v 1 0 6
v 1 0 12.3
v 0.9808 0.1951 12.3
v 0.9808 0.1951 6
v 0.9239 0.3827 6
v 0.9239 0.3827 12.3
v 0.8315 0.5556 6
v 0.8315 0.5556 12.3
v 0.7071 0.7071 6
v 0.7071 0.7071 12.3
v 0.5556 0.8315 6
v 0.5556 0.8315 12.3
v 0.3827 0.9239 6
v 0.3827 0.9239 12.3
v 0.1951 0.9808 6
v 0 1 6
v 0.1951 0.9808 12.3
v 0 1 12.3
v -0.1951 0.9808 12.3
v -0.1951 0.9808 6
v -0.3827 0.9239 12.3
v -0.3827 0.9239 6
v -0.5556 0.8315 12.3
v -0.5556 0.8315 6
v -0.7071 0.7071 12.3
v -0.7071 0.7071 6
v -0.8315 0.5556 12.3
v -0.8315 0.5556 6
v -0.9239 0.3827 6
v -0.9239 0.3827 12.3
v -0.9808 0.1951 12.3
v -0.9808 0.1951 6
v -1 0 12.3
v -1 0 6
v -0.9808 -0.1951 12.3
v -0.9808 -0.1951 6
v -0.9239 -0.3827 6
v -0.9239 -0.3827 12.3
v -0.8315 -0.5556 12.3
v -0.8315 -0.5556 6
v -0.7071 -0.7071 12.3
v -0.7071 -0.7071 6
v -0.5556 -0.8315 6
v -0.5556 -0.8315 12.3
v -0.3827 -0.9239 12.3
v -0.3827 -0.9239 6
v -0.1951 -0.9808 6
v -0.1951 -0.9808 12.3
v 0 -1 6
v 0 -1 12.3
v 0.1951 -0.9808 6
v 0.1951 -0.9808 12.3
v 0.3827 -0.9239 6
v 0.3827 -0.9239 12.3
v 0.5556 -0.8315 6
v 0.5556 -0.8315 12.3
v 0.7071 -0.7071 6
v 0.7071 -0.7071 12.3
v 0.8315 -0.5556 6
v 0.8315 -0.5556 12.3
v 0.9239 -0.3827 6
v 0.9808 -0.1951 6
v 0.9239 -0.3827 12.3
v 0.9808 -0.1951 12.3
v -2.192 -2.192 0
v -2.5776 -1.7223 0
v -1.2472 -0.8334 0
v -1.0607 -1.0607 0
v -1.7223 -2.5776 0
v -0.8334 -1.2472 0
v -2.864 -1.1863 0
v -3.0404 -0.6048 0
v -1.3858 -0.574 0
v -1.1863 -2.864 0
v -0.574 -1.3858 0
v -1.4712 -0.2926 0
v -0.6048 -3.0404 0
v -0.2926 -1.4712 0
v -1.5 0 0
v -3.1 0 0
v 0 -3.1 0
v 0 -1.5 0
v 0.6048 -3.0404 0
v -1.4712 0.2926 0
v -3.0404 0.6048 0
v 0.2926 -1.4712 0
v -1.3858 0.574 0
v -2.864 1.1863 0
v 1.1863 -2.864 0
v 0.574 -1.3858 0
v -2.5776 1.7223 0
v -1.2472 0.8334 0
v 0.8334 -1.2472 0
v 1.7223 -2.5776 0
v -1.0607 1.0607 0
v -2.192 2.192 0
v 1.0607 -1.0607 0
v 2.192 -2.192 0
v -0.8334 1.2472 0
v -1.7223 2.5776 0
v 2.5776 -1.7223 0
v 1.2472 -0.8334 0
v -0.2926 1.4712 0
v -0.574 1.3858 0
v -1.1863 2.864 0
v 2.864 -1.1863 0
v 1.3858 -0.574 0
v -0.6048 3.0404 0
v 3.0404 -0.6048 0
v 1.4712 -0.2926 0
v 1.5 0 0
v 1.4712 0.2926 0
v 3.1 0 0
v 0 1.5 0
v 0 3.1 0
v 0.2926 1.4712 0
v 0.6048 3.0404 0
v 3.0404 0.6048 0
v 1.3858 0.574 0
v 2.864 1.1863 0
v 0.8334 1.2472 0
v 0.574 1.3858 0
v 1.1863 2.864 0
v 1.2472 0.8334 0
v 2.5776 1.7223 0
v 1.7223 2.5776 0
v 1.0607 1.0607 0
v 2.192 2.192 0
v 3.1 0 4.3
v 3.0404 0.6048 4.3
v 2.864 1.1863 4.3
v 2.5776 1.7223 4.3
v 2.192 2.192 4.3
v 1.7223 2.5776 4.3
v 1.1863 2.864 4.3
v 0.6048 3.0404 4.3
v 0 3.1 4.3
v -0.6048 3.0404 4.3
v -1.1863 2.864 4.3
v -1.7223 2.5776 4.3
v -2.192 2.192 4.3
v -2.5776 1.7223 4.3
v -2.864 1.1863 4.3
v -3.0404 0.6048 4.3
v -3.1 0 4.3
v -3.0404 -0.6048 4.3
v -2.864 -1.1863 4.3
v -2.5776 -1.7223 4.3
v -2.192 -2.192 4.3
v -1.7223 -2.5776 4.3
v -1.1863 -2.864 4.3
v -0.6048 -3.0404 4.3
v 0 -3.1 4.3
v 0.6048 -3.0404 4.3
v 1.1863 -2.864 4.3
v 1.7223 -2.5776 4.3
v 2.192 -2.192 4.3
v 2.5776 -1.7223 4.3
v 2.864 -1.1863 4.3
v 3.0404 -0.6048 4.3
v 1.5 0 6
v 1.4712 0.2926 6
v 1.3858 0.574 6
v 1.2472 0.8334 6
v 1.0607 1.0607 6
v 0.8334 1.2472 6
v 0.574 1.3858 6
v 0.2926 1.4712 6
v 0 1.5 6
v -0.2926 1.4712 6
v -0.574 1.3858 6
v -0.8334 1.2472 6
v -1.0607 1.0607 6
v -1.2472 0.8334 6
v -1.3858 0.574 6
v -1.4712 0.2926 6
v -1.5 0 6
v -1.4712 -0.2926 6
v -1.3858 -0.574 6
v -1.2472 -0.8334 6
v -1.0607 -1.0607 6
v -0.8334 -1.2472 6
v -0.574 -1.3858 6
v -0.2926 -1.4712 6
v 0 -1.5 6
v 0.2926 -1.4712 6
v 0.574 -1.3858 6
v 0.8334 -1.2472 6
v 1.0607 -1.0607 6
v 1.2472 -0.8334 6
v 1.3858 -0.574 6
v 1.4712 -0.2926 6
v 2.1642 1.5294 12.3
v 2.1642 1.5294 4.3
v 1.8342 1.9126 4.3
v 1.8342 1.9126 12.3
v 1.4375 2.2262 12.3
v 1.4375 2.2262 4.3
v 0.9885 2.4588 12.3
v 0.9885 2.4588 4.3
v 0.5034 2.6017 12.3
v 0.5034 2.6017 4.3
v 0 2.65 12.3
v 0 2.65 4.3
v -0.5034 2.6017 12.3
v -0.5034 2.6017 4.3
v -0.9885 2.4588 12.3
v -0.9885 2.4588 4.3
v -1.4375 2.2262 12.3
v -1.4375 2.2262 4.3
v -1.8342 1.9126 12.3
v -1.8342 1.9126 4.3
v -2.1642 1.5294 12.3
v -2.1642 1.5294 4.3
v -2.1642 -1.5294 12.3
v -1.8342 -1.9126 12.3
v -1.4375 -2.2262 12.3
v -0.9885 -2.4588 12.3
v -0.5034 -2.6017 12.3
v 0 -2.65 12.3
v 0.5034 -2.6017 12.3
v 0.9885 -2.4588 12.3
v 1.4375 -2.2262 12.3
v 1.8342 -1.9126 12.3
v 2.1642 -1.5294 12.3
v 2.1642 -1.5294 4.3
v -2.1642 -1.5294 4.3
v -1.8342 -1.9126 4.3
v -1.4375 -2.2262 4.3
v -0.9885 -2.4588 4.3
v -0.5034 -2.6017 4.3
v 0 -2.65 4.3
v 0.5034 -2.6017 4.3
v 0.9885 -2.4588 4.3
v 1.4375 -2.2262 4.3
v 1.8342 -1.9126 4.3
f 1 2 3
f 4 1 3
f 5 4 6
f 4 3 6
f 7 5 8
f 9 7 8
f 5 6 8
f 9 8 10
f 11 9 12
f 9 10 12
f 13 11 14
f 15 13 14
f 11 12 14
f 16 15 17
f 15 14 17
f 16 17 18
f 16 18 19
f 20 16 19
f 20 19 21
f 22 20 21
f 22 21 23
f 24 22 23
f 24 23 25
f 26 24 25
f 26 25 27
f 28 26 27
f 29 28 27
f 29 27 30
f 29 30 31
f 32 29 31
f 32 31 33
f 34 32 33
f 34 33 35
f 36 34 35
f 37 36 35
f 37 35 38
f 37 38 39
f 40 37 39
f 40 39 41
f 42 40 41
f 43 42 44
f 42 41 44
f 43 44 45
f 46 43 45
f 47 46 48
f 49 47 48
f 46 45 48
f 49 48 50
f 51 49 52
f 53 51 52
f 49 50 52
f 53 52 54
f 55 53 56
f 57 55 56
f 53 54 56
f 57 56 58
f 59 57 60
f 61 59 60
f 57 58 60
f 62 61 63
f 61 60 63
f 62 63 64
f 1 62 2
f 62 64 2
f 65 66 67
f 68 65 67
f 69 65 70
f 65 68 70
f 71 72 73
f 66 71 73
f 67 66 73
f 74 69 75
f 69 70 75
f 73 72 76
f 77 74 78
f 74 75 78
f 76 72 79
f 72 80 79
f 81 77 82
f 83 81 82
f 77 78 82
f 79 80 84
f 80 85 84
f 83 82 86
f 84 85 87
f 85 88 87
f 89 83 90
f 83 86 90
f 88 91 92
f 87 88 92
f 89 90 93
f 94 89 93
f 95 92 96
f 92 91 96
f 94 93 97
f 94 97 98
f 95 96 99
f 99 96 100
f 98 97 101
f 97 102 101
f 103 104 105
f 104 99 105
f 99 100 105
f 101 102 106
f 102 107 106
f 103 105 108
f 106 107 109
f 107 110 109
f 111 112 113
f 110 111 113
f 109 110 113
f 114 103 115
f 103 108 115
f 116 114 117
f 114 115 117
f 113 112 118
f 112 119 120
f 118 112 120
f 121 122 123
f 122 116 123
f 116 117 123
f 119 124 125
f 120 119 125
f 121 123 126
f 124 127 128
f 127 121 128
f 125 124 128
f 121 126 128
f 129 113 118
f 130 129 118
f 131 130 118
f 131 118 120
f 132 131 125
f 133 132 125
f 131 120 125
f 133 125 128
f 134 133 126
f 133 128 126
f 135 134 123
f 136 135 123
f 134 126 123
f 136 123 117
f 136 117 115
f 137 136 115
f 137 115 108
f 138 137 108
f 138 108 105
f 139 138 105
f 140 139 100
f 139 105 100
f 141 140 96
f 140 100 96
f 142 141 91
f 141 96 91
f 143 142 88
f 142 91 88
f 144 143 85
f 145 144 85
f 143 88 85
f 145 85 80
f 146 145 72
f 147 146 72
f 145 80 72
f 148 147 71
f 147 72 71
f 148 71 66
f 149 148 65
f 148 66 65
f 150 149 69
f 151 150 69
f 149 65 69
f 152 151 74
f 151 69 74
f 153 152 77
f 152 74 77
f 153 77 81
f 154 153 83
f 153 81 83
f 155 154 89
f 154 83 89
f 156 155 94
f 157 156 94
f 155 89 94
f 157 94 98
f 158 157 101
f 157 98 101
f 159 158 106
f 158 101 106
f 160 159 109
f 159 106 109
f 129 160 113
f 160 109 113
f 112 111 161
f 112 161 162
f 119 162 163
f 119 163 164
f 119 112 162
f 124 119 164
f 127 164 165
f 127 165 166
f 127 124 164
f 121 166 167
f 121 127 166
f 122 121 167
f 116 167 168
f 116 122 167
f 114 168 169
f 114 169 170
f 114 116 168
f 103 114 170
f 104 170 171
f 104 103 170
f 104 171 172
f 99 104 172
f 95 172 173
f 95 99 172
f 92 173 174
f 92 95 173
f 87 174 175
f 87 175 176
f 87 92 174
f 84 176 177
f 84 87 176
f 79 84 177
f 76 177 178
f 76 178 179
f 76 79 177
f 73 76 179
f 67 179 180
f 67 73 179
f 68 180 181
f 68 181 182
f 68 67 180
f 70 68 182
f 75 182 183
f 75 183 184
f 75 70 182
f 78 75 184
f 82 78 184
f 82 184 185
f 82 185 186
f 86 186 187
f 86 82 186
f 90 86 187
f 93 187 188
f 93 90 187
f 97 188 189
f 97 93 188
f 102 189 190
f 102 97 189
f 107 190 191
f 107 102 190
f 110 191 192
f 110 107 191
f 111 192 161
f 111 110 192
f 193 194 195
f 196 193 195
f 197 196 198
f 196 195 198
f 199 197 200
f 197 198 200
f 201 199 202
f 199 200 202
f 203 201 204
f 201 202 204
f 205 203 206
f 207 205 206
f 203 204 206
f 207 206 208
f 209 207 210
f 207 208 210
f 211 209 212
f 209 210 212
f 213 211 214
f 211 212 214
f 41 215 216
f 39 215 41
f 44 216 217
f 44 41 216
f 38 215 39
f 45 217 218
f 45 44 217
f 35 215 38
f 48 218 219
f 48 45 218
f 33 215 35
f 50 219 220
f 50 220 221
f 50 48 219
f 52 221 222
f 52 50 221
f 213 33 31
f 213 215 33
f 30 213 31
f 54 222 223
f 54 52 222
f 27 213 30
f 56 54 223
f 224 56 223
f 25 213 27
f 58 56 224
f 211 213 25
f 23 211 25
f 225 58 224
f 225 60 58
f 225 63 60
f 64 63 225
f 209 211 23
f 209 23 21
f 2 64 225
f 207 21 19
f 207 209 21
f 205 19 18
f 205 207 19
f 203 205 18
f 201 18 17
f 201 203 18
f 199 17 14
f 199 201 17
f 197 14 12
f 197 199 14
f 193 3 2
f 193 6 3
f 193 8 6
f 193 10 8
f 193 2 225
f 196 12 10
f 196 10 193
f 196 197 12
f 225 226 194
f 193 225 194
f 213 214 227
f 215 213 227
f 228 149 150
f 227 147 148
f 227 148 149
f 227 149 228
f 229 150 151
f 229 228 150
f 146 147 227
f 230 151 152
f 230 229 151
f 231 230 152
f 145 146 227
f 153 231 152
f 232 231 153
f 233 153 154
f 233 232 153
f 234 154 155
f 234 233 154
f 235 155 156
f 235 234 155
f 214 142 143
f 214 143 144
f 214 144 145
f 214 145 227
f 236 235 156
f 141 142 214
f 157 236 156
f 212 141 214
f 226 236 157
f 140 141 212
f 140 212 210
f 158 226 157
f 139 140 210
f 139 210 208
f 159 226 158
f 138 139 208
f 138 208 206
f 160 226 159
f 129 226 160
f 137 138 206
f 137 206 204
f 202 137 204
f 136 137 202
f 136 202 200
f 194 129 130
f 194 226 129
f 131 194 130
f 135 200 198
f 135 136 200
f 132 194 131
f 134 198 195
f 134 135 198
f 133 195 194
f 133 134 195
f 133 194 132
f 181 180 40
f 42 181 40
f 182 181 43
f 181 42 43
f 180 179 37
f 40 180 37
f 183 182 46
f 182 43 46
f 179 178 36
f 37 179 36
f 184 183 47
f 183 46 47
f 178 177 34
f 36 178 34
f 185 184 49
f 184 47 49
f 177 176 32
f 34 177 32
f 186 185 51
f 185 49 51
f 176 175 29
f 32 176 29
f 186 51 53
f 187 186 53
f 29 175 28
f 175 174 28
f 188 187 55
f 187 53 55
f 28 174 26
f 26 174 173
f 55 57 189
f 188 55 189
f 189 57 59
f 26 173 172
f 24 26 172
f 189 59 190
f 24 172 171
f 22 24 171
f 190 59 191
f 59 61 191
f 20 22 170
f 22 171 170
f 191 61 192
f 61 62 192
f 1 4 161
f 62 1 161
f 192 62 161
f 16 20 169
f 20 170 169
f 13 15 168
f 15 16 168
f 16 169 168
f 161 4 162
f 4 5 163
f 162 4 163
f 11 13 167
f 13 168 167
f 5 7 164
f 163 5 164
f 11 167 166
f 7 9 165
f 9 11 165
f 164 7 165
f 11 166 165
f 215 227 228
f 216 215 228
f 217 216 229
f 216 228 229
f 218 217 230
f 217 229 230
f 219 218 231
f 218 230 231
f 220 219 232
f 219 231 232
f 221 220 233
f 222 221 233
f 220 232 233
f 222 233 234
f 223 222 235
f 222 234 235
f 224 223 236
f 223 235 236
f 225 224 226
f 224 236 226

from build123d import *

# Parameters (mm, degrees)
F0_R     = 3.1
F0_R_2   = 1.5
F1_DEPTH = 4.3
F3_DEPTH = 8
F4_R     = 1
F5_DEPTH = 8
F6_DEPTH = 6


with BuildPart() as f1:
    # F0 (on Top) → F1 (new body)
    with BuildSketch(Plane.XY):
        Circle(F0_R)
        Circle(F0_R_2, mode=Mode.SUBTRACT)
        Circle(F0_R_2)
    extrude(amount=F1_DEPTH)

    # F2 (on face) → F3 (join)
    with BuildSketch(Plane.XY.offset(4.3)):
        with BuildLine():
            Line((2.164151, -1.529363), (2.164151, 1.529363))
            ThreePointArc((2.164151, 1.529363), (0, 2.65), (-2.164151, 1.529363))
            Line((-2.164151, 1.529363), (-2.164151, -1.529363))
            ThreePointArc((-2.164151, -1.529363), (0, -2.65), (2.164151, -1.529363))
        make_face()
    extrude(amount=F3_DEPTH)

    # F4 (on face) → F5 (cut)
    with BuildSketch(Plane.XY.offset(12.3)):
        Circle(F4_R)
    extrude(amount=-F5_DEPTH, mode=Mode.SUBTRACT)

    # F0 (on Top) → F6 (cut)
    with BuildSketch(Plane.XY):
        Circle(F0_R_2)
    extrude(amount=F6_DEPTH, mode=Mode.SUBTRACT)


solid = f1.part
